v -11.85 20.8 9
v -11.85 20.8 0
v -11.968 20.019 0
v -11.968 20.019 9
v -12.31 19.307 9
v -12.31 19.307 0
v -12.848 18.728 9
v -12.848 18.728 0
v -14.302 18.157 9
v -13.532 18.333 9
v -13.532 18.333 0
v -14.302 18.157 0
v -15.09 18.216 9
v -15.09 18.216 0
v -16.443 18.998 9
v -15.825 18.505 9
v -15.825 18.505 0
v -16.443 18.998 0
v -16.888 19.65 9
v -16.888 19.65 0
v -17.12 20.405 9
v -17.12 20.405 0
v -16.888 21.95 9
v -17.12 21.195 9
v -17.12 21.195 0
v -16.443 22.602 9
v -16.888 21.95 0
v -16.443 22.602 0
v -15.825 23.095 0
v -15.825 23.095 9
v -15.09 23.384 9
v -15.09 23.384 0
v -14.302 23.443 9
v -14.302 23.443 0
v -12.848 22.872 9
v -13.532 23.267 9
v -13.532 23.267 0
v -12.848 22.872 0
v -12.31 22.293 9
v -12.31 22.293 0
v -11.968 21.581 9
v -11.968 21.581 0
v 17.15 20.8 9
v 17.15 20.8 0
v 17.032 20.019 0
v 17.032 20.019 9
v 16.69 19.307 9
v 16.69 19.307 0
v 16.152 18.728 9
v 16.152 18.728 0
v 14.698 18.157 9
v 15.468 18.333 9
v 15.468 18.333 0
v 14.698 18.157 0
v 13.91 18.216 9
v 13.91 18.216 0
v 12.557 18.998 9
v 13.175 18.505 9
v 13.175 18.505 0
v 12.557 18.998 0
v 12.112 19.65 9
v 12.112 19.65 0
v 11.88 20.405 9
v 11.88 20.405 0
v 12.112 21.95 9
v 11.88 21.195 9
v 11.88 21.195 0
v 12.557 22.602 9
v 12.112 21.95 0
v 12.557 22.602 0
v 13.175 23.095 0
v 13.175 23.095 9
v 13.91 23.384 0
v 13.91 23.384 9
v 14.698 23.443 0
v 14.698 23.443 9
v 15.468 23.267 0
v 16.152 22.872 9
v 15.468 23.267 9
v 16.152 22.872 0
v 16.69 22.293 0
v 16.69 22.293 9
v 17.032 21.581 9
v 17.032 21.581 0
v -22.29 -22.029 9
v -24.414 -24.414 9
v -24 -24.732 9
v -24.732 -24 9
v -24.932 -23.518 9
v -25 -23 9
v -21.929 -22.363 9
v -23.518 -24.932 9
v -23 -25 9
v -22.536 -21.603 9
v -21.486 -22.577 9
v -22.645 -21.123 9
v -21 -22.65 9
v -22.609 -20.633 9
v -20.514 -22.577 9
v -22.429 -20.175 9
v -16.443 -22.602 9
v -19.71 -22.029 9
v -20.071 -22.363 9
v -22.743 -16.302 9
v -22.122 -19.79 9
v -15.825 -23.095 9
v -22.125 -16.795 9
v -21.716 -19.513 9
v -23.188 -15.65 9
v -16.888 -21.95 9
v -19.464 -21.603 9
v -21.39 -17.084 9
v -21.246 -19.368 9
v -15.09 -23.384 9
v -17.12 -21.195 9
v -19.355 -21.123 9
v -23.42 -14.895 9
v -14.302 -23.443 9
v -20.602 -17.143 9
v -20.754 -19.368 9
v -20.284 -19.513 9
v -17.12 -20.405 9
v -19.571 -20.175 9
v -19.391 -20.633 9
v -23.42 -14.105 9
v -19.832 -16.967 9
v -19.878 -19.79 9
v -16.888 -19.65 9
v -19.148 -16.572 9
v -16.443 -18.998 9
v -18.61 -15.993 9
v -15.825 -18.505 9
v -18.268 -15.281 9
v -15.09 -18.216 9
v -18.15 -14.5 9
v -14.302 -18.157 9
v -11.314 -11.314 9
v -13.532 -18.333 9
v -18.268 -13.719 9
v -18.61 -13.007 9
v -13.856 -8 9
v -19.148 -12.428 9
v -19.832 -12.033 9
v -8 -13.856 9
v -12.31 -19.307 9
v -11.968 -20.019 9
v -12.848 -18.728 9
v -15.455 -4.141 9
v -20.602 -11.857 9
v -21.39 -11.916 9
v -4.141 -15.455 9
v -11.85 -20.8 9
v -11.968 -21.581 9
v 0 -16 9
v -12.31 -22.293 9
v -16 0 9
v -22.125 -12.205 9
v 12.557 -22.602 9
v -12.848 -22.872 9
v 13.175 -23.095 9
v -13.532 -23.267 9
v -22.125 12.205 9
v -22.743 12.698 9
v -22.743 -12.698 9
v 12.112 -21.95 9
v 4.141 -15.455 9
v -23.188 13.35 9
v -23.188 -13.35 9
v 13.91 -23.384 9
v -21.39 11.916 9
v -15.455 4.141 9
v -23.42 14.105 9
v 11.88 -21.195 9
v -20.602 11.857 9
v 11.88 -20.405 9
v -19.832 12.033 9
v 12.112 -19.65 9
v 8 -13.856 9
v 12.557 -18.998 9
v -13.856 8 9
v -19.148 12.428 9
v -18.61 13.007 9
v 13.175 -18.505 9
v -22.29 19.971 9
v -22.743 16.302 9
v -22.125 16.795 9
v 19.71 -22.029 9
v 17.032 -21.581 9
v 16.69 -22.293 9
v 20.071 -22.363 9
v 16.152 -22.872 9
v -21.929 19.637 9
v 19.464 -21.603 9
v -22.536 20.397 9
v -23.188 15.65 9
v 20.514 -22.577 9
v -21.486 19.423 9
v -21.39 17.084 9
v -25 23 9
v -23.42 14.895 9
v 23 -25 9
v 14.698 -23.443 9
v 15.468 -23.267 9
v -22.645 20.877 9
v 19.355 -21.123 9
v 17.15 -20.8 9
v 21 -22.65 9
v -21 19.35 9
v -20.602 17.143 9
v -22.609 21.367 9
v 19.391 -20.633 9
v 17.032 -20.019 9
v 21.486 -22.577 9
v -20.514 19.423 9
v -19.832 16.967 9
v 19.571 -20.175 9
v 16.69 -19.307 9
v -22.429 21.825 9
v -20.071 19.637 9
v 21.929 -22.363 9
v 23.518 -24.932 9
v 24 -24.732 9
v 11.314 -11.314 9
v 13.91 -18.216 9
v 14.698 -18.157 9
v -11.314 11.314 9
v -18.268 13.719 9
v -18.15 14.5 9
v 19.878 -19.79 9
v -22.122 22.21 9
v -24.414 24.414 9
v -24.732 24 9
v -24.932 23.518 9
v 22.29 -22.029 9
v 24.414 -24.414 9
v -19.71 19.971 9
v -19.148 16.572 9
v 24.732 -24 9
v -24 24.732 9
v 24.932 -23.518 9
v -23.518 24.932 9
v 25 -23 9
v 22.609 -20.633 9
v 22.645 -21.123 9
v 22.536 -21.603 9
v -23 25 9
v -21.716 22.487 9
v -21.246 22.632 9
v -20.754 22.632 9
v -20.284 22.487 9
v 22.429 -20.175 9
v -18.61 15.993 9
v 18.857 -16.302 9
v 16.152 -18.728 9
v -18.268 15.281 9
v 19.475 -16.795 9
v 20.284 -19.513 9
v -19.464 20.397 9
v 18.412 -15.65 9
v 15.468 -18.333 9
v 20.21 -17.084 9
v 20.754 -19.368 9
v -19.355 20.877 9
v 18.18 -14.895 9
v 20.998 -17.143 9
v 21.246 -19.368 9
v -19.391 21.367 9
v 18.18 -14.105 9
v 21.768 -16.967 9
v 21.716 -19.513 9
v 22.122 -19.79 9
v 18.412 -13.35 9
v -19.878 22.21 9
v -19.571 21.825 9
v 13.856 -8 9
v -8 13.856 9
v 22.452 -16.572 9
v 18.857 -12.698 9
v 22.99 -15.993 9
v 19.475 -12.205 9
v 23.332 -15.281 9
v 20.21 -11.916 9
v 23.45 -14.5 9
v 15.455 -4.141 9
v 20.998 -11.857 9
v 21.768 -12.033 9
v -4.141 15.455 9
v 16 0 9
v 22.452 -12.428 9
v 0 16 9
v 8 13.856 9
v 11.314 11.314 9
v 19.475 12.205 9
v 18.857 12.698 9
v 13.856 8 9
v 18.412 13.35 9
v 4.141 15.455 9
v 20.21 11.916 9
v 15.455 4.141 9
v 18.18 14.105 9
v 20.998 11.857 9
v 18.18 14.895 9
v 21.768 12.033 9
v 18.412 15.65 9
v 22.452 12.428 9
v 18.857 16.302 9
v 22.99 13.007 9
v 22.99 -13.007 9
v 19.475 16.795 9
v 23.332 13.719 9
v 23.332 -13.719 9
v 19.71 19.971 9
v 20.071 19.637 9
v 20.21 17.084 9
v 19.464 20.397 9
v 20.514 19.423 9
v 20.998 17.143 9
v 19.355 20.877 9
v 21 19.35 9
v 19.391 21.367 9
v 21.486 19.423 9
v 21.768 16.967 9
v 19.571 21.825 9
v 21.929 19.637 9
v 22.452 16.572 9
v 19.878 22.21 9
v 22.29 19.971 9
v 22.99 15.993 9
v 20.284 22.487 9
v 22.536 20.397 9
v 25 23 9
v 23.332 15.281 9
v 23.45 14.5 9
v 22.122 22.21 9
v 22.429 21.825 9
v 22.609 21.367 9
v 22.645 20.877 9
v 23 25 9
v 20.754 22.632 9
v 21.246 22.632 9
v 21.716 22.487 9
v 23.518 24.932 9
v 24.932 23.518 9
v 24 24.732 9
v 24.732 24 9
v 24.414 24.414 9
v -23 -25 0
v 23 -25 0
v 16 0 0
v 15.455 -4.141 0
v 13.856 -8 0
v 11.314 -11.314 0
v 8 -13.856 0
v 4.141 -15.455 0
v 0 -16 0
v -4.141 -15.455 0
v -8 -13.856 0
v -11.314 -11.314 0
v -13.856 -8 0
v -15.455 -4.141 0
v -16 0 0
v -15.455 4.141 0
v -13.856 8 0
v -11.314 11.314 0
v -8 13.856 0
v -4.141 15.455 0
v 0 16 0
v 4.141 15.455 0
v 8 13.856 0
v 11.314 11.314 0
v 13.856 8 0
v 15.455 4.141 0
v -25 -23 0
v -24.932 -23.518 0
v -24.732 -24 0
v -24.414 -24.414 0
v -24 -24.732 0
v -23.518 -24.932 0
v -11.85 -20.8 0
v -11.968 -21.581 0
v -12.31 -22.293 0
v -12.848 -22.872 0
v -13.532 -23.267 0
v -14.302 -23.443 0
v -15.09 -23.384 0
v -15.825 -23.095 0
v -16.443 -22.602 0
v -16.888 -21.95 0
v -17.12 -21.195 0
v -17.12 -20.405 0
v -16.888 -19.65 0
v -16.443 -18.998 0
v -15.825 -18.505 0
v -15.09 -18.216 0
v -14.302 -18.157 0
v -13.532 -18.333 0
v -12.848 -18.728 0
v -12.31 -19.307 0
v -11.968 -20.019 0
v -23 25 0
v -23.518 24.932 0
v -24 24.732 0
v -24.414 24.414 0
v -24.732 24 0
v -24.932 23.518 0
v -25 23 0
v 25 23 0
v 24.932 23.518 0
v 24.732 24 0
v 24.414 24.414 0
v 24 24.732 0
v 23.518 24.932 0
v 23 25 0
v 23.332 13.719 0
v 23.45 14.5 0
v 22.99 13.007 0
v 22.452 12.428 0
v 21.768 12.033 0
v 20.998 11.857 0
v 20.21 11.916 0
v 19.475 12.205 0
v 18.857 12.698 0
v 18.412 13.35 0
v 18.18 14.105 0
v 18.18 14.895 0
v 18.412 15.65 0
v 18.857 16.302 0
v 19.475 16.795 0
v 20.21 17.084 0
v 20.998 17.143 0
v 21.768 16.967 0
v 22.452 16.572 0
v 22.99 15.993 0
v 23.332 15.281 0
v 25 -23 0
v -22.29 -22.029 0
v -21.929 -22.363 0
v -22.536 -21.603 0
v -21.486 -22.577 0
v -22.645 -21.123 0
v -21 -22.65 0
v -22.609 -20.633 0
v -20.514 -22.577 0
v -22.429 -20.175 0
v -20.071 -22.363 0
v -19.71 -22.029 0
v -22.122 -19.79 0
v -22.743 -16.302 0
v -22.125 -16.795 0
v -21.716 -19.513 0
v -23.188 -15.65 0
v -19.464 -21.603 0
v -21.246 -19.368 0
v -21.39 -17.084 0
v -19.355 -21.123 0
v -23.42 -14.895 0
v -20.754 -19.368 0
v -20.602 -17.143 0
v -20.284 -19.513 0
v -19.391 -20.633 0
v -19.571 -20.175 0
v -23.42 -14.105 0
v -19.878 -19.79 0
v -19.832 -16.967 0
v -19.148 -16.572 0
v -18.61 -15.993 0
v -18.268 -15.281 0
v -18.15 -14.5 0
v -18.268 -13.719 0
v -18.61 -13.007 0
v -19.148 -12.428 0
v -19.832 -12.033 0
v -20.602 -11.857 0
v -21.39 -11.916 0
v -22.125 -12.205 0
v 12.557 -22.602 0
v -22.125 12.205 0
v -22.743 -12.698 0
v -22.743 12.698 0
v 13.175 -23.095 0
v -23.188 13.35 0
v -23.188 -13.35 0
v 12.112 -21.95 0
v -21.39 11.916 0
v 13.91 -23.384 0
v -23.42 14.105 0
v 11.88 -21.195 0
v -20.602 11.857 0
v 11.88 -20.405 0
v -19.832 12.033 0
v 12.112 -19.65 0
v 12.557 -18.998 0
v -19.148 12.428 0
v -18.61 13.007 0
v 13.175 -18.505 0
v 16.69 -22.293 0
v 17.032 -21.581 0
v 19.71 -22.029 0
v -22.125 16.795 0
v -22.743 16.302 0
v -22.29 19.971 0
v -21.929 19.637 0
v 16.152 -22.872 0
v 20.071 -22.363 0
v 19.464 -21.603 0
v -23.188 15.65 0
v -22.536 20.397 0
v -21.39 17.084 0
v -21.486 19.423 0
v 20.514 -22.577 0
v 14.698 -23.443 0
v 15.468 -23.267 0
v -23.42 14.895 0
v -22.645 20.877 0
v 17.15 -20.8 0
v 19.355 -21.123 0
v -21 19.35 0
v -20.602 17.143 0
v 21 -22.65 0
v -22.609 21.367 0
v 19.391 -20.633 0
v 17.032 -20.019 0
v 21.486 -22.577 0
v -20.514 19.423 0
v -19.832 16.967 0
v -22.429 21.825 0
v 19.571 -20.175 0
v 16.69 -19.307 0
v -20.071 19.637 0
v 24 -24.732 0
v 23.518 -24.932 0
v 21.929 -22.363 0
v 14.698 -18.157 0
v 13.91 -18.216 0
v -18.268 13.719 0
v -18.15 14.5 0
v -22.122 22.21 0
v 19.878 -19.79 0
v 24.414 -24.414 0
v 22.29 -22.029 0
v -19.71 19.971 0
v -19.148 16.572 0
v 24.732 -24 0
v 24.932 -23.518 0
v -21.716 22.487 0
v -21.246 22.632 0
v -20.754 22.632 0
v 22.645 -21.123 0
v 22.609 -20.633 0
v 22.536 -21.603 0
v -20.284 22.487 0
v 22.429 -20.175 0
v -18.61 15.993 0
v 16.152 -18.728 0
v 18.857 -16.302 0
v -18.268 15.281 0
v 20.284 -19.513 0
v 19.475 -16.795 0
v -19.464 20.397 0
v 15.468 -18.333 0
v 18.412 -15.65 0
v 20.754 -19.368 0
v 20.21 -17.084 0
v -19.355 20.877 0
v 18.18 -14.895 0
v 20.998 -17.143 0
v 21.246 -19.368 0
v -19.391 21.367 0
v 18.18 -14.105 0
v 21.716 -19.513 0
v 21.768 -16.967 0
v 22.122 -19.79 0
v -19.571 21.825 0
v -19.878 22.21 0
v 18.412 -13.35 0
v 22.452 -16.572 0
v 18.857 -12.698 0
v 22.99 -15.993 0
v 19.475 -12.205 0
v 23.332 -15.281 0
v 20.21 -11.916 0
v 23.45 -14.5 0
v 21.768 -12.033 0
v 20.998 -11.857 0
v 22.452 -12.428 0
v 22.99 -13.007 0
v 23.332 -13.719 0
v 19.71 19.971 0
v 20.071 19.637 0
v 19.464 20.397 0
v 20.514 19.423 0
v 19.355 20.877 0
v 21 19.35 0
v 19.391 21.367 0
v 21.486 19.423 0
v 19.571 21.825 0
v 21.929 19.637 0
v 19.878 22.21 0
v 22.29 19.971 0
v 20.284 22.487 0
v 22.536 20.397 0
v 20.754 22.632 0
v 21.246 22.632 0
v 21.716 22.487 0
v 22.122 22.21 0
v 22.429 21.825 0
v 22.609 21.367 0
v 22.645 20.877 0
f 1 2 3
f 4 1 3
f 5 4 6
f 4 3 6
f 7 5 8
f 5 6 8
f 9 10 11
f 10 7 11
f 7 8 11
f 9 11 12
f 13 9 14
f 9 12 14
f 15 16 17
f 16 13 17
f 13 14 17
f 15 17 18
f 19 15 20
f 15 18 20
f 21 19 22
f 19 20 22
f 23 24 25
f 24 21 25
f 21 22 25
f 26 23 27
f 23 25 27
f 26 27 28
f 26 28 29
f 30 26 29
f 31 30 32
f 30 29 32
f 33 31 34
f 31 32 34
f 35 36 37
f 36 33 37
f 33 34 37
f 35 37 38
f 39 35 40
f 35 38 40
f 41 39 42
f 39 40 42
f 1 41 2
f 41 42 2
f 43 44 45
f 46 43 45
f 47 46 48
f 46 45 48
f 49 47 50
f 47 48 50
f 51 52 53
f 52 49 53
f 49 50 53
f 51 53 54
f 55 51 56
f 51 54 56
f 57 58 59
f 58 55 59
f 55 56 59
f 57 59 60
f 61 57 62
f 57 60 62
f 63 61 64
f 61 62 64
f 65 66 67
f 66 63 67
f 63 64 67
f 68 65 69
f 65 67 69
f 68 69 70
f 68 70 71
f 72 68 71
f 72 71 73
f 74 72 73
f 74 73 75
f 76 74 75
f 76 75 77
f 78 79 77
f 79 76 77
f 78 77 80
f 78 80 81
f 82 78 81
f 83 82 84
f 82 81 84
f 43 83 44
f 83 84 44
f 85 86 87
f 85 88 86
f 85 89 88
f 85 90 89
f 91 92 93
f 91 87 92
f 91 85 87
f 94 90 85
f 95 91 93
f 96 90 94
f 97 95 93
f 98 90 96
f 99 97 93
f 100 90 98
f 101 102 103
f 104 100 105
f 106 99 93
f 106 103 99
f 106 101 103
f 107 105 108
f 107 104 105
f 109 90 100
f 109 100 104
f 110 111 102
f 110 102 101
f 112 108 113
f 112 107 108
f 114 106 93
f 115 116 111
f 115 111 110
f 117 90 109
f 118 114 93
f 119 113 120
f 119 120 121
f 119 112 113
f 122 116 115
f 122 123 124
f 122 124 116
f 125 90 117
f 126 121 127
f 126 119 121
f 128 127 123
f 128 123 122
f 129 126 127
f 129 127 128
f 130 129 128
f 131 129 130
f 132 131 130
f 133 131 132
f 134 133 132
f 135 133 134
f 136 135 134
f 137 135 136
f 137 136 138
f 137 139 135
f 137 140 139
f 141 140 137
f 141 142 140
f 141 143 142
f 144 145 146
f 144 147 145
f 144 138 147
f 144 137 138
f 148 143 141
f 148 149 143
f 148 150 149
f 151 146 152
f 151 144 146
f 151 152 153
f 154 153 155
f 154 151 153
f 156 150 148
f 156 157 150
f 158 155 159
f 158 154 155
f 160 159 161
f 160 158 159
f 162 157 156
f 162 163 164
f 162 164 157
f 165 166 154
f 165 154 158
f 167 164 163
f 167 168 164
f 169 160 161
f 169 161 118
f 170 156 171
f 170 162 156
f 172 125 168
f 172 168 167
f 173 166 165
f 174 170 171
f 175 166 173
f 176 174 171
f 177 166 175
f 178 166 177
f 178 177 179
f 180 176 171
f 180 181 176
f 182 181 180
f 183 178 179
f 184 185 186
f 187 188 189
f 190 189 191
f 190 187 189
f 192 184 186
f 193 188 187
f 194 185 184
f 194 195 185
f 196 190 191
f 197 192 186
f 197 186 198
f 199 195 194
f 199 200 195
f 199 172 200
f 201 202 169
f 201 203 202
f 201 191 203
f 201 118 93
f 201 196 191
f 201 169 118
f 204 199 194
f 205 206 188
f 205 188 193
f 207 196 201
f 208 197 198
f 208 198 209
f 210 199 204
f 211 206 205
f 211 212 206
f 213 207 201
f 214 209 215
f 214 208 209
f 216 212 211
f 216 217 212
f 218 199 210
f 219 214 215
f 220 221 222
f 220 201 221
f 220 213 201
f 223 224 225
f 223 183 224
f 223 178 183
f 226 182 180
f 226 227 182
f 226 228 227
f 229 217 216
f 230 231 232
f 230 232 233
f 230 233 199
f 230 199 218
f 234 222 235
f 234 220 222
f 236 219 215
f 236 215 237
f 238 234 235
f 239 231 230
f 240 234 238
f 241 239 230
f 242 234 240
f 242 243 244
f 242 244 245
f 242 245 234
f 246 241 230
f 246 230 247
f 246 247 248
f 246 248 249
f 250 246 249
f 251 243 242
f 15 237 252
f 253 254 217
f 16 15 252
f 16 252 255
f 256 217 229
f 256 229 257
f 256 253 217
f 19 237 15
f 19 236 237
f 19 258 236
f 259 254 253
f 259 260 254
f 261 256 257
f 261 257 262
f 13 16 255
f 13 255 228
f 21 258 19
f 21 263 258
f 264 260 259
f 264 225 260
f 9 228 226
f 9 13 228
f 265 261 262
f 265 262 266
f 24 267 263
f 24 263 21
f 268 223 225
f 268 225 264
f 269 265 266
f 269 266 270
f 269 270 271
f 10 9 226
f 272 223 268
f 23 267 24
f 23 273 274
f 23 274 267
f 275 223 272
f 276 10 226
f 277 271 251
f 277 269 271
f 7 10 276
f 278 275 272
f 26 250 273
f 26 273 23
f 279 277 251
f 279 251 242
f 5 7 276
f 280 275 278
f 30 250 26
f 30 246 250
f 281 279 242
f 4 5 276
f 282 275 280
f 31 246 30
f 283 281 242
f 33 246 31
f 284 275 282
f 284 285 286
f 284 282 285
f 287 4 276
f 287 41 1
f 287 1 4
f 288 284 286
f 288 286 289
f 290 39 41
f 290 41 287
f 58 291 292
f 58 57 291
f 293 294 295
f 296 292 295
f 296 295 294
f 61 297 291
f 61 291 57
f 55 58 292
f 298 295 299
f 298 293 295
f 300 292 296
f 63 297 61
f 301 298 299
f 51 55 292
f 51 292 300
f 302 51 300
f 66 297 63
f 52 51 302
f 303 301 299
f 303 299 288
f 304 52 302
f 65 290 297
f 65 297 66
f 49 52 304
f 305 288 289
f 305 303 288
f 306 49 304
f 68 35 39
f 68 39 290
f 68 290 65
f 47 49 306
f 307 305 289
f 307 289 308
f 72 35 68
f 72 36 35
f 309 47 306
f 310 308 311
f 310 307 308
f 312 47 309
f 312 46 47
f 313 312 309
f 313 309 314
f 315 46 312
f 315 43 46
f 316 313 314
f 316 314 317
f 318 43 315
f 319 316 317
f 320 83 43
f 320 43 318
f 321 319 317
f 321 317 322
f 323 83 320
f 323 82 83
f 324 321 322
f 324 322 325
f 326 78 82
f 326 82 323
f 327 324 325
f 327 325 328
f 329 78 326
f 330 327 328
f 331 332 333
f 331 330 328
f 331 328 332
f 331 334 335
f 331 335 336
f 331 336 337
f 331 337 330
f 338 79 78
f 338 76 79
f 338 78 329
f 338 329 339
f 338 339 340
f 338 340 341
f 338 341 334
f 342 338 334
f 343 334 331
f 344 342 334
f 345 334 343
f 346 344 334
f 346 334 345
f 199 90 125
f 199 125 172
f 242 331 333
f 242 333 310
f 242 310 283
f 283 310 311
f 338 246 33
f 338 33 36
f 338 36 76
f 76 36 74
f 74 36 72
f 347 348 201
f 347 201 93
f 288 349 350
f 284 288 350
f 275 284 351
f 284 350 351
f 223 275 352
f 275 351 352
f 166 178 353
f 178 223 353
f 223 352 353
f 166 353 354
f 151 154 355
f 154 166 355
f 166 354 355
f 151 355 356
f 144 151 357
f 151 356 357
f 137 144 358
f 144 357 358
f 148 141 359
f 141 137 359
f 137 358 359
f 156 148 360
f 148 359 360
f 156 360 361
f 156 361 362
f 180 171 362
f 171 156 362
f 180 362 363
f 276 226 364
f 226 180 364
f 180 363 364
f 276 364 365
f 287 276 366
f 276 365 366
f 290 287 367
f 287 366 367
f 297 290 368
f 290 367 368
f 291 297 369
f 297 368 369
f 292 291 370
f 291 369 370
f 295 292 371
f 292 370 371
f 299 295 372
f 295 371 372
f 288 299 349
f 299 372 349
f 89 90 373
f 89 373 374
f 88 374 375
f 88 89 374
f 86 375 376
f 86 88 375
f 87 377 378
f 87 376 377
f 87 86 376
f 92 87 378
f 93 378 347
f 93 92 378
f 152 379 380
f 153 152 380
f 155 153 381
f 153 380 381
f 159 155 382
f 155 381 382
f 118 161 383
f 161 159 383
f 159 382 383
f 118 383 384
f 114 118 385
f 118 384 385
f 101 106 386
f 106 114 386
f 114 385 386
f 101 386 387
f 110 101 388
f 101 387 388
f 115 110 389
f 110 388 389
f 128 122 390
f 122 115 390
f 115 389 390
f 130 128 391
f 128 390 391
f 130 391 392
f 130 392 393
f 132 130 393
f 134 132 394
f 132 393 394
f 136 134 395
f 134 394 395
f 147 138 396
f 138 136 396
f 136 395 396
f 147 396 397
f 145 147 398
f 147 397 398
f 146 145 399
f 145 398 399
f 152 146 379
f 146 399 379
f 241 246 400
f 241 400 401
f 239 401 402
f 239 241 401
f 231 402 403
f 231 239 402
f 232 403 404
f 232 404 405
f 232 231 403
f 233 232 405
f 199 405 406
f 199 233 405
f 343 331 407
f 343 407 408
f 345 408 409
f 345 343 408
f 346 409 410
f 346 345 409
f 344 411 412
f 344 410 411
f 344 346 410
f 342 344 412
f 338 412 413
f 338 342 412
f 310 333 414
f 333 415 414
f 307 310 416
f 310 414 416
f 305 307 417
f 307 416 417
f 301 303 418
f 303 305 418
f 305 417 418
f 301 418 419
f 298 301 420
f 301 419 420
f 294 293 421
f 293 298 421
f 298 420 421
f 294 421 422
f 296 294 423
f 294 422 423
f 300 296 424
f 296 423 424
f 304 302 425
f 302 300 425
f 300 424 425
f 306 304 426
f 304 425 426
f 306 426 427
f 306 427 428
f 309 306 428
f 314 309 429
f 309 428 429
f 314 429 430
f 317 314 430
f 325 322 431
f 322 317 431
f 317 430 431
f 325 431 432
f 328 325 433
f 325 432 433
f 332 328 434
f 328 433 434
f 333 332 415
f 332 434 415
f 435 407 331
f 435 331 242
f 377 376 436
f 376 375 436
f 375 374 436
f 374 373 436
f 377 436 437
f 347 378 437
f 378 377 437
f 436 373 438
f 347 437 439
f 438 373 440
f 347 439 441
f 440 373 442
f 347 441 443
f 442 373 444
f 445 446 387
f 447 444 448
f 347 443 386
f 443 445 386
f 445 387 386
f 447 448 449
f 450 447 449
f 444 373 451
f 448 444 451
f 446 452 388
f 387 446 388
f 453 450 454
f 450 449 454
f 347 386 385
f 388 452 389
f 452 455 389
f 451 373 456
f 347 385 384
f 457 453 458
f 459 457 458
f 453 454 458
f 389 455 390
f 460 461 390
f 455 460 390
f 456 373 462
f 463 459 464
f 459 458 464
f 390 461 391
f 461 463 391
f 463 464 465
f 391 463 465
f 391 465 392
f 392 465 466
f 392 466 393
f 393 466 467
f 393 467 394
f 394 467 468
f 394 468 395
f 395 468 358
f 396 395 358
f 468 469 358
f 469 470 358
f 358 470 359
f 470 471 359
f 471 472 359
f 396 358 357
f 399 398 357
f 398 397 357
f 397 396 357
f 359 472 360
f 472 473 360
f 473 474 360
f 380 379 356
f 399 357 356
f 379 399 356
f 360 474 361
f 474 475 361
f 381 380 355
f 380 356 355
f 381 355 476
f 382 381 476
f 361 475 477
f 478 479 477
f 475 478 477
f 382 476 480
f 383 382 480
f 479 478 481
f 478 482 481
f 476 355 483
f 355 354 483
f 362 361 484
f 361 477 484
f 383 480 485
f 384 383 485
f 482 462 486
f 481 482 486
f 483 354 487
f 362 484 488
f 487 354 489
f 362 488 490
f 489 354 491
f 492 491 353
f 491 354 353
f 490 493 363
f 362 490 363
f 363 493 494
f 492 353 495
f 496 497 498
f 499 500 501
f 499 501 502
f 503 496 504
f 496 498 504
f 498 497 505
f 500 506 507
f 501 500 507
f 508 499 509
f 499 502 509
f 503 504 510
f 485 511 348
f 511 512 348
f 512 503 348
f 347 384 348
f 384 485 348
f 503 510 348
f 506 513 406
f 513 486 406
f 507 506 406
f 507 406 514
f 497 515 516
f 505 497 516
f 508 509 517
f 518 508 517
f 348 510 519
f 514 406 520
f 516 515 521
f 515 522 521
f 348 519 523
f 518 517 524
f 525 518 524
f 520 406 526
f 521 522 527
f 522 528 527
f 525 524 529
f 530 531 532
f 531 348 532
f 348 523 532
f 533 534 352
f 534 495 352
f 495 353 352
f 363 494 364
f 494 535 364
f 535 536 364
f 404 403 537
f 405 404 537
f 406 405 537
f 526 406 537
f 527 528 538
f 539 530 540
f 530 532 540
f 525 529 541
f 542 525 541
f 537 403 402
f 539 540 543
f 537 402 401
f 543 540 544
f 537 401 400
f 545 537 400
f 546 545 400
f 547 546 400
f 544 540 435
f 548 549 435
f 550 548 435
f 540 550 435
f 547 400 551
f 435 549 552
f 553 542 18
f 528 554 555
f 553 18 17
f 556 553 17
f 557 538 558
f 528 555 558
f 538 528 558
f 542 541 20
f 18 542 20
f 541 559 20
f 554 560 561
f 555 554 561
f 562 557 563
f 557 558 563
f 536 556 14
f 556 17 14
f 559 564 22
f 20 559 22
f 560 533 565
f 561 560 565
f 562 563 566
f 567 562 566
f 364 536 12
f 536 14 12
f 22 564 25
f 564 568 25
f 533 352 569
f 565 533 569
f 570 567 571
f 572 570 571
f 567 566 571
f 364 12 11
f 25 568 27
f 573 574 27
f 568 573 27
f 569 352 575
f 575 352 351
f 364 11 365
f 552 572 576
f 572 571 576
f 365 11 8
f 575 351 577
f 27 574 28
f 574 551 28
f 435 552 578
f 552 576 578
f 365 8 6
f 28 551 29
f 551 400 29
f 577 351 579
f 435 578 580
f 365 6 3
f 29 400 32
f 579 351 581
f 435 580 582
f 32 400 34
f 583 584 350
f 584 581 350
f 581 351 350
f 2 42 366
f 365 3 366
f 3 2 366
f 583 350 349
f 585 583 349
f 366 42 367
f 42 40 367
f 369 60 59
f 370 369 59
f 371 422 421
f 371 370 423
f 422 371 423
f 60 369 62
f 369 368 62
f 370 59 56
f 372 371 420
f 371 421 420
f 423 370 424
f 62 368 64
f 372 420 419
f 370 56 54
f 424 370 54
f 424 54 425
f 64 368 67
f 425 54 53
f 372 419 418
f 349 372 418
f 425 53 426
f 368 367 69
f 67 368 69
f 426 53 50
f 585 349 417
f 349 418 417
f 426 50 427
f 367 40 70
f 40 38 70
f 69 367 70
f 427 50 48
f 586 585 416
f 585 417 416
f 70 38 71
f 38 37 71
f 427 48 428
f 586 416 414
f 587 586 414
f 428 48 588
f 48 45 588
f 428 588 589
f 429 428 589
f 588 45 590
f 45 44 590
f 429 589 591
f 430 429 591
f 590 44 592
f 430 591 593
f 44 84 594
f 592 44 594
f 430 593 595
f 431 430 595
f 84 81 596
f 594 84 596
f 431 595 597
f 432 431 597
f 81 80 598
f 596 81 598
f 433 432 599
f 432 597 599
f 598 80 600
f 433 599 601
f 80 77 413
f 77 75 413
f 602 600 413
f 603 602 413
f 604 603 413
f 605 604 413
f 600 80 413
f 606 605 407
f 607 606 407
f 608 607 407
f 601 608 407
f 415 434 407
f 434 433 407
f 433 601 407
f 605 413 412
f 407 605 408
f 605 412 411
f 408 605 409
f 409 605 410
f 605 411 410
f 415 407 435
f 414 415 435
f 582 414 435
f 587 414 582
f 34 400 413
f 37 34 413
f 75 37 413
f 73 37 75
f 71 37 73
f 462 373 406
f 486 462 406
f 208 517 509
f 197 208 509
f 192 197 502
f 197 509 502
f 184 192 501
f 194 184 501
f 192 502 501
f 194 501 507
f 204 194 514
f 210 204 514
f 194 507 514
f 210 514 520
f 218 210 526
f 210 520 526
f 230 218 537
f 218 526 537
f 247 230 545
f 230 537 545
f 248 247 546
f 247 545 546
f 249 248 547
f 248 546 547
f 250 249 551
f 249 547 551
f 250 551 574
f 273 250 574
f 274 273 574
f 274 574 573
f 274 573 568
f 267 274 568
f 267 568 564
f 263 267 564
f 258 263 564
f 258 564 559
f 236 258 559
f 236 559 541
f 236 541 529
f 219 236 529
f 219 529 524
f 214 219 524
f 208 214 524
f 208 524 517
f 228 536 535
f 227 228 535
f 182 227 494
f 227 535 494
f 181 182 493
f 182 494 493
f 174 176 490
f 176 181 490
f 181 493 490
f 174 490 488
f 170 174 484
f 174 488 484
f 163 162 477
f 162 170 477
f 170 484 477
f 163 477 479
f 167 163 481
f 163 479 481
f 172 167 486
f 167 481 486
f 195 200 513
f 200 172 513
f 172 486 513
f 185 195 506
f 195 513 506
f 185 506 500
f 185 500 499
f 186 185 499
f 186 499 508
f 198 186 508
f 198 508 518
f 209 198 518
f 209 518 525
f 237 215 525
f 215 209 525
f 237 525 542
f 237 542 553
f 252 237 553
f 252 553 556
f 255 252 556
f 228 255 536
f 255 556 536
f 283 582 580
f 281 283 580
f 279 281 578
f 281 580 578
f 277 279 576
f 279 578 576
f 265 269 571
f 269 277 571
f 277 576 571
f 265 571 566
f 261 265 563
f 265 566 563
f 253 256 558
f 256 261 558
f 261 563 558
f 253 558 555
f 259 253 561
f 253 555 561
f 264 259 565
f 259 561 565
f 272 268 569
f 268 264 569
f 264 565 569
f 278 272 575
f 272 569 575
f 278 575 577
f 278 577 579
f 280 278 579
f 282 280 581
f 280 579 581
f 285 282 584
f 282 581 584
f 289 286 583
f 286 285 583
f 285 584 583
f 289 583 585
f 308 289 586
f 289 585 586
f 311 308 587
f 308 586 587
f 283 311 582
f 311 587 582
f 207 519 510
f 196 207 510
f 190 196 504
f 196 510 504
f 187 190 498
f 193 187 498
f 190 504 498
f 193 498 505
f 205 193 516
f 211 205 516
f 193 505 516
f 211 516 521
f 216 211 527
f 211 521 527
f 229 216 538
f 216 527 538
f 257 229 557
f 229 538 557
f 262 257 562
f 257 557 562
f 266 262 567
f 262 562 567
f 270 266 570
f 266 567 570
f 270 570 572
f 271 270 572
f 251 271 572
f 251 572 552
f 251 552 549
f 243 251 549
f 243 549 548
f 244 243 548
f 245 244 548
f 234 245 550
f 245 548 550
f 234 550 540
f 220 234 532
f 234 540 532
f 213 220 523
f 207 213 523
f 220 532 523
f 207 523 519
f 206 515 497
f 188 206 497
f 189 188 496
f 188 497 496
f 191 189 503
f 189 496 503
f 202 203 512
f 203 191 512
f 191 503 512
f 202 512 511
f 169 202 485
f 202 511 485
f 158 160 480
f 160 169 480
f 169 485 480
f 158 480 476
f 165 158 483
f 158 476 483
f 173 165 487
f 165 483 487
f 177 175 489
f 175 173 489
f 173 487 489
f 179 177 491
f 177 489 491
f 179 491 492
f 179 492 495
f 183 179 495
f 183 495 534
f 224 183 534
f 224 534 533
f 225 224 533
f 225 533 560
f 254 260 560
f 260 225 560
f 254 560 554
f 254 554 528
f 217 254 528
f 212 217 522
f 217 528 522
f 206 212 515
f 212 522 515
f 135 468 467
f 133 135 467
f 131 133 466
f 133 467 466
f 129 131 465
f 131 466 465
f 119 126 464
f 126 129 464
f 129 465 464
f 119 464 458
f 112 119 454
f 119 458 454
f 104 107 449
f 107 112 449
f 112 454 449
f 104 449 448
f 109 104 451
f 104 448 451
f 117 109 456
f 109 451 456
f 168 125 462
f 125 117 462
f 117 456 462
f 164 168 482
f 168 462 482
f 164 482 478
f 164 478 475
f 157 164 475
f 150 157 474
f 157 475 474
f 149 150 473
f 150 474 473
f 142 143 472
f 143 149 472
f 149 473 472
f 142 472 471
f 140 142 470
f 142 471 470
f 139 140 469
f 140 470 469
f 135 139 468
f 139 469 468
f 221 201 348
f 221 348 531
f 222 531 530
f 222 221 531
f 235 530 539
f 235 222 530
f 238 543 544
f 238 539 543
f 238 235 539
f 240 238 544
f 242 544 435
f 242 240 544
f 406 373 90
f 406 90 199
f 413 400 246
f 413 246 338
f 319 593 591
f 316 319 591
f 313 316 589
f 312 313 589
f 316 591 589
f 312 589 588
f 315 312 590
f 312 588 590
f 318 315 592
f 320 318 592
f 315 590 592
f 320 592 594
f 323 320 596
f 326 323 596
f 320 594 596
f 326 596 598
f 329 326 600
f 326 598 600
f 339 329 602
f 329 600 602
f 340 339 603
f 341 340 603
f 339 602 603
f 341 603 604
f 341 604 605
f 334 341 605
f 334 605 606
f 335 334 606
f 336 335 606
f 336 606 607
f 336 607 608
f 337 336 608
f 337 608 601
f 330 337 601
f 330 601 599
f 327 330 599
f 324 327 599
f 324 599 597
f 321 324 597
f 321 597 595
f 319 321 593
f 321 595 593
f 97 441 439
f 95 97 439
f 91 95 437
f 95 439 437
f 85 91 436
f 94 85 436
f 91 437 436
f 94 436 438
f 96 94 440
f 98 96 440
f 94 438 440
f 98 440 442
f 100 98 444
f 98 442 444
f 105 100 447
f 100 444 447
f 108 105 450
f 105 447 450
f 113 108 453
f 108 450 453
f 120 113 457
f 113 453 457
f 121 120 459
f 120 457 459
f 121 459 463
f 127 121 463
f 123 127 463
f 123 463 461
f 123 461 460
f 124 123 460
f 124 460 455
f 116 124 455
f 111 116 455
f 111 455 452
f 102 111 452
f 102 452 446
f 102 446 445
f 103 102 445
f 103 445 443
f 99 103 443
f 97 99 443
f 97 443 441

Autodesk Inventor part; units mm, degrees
ref_plane "YZ Plane" through (0, 0, 0) normal (1, 0, 0) x (0, 1, 0)
ref_plane "XZ Plane" through (0, 0, 0) normal (0, 1, 0) x (-1, 0, 0)
ref_plane "XY Plane" through (0, 0, 0) normal (0, 0, 1) x (1, 0, 0)
sketch "Sketch1" plane through (0, 0, 0) normal (0, 0, 1) x (1, 0, 0)
  line L0 (-25, 25) -> (25, 25)
  line L1 (25, 25) -> (25, -25)
  line L2 (25, -25) -> (-25, -25)
  line L3 (-25, -25) -> (-25, 25)
  line L4 (-25, 25) -> (25, -25) construction
  line L5 (25, 25) -> (-25, -25) construction
  circle A0 centre (0, 0) radius 16
  circle A1 centre (-20.8, -14.5) radius 2.65
  circle A2 centre (-14.5, -20.8) radius 2.65
  circle A3 centre (-20.8, 14.5) radius 2.65
  circle A4 centre (20.8, -14.5) radius 2.65
  circle A5 centre (20.8, 14.5) radius 2.65
  circle A6 centre (-14.5, 20.8) radius 2.65
  circle A7 centre (14.5, -20.8) radius 2.65
  circle A8 centre (14.5, 20.8) radius 2.65
  dimension "d0" = 50
  dimension "d1" = 50
  dimension "d2" = 32
  dimension "d5" = 5.3
  dimension "d6" = 4.2
  dimension "d8" = 10.5
  dimension "d11" = 29
  dimension "d14" = 41.6
extrude "Extrusion1" add sketch "Sketch1" along normal blind 9
fillet "Fillet1" radius 2 4 edges at (-25, 25, 4.5) (25, 25, 4.5) (-25, -25, 4.5) (25, -25, 4.5)
sketch "Sketch2" plane through (0, 0, 9) normal (0, 0, 1) x (1, 0, 0)
  arc A0 (23, -25) -> (25, -23) centre (23, -23) ccw projected
  line L0 (25, -23) -> (25, 23) projected
  arc A1 (25, 23) -> (23, 25) centre (23, 23) ccw projected
  line L1 (23, 25) -> (-23, 25) projected
  arc A2 (-23, 25) -> (-25, 23) centre (-23, 23) ccw projected
  line L2 (-25, 23) -> (-25, -23) projected
  arc A3 (-25, -23) -> (-23, -25) centre (-23, -23) ccw projected
  line L3 (-23, -25) -> (23, -25) projected
  circle A4 centre (14.5, 20.8) radius 2.65 projected
  circle A5 centre (-14.5, 20.8) radius 2.65 projected
  circle A6 centre (14.5, -20.8) radius 2.65 projected
  circle A7 centre (20.8, 14.5) radius 2.65 projected
  circle A8 centre (20.8, -14.5) radius 2.65 projected
  circle A9 centre (-20.8, 14.5) radius 2.65 projected
  circle A10 centre (-14.5, -20.8) radius 2.65 projected
  circle A11 centre (-20.8, -14.5) radius 2.65 projected
  circle A12 centre (0, 0) radius 16 projected
  line L4 (21, -21) -> (-21, -21)
  line L5 (-21, -21) -> (-21, 21)
  line L6 (-21, 21) -> (21, 21)
  line L7 (21, 21) -> (21, -21)
  line L8 (21, -21) -> (-21, 21) construction
  line L9 (-21, -21) -> (21, 21) construction
  circle A13 centre (-28.6, 21.06) radius 1.55 projected
  dimension "d18" = 42
  dimension "d19" = 42
hole "Hole1" at (-21, 21, 9) at (21, 21, 9) at (21, -21, 9) at (-21, -21, 9) direction (0, 0, -1) diameter 3.3 end through all both
properties part number "20_IM_LED_holder"
